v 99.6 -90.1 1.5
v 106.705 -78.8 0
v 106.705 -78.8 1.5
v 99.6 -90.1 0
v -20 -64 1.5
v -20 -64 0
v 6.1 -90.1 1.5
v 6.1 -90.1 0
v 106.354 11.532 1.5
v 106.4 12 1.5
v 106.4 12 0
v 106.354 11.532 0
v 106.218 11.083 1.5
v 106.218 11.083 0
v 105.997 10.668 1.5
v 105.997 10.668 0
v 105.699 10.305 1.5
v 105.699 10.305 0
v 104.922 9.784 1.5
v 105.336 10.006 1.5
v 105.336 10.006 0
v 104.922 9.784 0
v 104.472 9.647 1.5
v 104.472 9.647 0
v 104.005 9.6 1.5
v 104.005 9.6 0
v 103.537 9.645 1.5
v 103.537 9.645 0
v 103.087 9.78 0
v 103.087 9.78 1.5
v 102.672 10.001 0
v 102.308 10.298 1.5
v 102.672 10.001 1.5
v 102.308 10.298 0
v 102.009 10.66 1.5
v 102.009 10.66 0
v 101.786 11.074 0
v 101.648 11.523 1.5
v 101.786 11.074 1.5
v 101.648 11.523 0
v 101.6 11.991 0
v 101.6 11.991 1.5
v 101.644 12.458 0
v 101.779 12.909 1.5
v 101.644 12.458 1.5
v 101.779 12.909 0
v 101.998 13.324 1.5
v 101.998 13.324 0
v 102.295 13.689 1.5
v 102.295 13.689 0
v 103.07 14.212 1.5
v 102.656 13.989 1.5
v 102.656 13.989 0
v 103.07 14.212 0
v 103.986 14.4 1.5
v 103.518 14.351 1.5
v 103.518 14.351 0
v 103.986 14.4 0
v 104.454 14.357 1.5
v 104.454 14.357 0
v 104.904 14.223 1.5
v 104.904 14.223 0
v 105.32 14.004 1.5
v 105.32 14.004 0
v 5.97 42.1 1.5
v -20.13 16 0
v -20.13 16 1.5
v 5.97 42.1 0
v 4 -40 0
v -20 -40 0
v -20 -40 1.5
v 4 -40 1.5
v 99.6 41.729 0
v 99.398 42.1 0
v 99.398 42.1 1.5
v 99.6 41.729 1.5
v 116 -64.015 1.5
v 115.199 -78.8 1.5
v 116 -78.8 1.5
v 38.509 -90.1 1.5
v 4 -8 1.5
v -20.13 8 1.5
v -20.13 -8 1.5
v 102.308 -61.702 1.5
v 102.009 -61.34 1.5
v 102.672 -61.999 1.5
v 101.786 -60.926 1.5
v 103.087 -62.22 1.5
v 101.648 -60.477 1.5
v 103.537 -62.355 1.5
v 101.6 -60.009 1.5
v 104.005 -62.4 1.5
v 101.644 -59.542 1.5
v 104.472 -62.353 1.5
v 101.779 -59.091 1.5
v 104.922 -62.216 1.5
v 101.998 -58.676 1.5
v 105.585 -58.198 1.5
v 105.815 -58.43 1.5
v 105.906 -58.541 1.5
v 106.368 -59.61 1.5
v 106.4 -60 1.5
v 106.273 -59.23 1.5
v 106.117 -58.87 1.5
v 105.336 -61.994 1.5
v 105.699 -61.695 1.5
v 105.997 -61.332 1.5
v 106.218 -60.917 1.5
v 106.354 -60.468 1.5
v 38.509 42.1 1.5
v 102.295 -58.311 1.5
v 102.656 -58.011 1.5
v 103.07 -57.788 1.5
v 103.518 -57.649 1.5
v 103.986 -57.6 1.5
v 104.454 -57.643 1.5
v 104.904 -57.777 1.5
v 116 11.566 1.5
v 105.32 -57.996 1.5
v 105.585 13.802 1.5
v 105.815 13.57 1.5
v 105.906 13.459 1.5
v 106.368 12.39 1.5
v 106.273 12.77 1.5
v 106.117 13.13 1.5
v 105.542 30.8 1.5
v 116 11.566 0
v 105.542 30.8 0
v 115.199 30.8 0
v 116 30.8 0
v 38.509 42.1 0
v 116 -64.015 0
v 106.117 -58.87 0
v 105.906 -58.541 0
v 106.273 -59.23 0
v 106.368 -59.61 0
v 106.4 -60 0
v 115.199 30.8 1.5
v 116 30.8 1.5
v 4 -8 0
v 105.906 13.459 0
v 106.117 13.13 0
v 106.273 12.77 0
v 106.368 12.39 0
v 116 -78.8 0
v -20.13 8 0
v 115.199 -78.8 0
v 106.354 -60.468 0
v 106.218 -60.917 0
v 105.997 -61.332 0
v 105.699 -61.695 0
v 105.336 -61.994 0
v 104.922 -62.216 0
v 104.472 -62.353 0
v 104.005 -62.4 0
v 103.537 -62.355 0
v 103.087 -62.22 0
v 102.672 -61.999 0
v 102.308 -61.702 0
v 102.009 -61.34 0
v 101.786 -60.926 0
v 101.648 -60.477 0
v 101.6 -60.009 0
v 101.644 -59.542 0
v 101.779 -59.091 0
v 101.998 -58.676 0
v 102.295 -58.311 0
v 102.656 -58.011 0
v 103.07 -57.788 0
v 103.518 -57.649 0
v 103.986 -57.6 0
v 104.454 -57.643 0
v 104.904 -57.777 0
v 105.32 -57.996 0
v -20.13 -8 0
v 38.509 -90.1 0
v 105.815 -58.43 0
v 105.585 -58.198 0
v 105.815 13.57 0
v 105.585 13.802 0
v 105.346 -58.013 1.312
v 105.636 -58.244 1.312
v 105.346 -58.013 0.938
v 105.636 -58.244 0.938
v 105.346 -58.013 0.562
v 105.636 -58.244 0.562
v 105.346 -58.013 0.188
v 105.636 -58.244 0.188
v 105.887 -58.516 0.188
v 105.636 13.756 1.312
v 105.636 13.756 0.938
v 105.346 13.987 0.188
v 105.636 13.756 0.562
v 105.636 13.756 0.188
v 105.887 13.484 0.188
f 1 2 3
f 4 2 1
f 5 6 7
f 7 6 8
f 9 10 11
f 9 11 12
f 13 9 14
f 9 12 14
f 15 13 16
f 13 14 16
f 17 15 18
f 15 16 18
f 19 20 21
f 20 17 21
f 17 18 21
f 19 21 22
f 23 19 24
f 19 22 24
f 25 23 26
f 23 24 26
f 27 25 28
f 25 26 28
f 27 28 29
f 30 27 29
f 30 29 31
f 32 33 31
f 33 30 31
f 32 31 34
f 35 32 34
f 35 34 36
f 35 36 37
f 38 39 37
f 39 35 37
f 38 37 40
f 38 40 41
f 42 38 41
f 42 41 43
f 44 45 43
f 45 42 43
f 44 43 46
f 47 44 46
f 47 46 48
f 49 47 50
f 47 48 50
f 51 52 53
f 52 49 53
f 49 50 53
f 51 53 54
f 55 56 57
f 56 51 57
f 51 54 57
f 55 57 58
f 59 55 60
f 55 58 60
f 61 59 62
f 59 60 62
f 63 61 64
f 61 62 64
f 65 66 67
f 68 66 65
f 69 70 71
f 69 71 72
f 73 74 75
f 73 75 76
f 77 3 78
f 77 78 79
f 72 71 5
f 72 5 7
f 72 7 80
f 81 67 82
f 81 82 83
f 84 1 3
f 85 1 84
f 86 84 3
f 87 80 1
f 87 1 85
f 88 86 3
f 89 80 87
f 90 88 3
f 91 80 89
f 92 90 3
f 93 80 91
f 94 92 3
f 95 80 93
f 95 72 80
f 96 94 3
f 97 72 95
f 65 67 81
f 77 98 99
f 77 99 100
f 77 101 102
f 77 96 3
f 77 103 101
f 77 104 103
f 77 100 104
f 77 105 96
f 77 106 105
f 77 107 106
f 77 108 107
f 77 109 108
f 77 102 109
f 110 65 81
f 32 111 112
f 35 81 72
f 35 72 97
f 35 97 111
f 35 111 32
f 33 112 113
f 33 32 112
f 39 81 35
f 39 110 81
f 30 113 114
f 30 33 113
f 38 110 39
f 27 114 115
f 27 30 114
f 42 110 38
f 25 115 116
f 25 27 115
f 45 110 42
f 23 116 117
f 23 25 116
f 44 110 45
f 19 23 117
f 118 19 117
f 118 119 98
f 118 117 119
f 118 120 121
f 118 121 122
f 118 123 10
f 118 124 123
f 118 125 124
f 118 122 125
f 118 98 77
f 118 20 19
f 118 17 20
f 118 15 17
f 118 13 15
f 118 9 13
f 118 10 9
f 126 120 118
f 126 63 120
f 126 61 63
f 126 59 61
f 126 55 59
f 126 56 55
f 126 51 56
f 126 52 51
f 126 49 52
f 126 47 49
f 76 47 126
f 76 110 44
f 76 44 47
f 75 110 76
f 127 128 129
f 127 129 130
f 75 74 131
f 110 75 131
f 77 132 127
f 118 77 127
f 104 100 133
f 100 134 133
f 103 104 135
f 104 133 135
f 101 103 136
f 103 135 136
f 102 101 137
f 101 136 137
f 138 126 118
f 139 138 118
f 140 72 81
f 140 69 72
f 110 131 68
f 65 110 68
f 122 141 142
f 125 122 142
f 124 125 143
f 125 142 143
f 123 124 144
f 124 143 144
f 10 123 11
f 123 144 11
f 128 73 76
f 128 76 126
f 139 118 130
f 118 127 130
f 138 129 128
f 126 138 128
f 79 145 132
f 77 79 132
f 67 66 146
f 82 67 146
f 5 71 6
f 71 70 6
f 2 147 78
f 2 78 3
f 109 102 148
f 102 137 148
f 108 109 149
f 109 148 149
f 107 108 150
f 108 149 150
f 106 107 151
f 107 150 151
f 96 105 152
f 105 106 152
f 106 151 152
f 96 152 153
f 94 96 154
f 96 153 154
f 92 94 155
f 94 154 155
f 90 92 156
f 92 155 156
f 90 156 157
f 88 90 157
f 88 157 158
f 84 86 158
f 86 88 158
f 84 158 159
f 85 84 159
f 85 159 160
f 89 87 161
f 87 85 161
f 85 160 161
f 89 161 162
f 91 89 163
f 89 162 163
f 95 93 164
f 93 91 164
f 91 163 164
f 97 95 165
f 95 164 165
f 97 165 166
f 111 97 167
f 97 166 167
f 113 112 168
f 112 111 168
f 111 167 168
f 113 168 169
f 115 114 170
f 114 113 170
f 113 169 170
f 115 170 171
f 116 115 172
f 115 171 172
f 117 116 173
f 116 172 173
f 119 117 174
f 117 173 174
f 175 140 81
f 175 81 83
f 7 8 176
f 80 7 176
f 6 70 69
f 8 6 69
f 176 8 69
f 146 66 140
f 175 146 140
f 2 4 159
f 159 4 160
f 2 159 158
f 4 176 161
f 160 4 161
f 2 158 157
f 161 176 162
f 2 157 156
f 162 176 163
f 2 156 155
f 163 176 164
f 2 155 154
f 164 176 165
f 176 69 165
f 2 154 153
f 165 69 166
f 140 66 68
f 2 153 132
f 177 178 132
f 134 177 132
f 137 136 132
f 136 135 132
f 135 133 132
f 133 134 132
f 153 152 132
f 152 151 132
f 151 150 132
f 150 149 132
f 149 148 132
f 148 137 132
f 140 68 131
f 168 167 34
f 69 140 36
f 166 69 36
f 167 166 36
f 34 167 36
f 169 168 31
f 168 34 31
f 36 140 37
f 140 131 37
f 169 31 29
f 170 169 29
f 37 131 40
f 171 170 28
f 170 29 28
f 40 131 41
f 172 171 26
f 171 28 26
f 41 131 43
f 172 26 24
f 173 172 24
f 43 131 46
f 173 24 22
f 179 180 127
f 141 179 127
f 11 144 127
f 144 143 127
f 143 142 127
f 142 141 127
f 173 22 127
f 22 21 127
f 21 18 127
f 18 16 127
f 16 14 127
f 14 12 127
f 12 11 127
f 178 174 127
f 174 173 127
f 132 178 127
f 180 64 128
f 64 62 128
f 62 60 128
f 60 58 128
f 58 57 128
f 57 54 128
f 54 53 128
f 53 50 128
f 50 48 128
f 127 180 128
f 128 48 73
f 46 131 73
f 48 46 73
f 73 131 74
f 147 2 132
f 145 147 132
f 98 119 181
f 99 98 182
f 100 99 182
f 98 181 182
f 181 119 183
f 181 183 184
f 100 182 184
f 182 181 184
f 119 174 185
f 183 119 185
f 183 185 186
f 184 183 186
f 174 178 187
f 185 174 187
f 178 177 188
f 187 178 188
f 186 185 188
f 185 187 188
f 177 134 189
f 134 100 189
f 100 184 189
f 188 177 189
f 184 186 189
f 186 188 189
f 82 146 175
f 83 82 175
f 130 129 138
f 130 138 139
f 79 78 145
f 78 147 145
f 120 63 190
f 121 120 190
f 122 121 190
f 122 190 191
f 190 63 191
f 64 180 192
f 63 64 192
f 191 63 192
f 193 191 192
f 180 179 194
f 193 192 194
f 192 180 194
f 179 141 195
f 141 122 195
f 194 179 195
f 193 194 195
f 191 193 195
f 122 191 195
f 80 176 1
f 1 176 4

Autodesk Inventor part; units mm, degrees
ref_plane "YZ Plane" through (0, 0, 0) normal (1, 0, 0) x (0, 1, 0)
ref_plane "XZ Plane" through (0, 0, 0) normal (0, 1, 0) x (-1, 0, 0)
ref_plane "XY Plane" through (0, 0, 0) normal (0, 0, 1) x (1, 0, 0)
sketch "Esboço1" plane through (0, 0, 0) normal (0, 0, 1) x (1, 0, 0)
  line L0 (88, 16) -> (56, 16) projected
  line L1 (88, -64) -> (56, -64) projected
  line L2 (116, -64.0154) -> (116, 11.5655)
  line L3 (-8, -88.1) -> (-8, -95.9) projected
  line L4 (38.5088, -95.9) -> (-8, -95.9) projected
  line L5 (38.5088, -95.9) -> (38.5088, -88.1) projected
  line L6 (38.5088, 47.9) -> (38.5088, 40.1) projected
  line L7 (38.5088, 47.9) -> (-8, 47.9) projected
  line L8 (-8, 40.1) -> (-8, 47.9) projected
  line L9 (99.6, 47.9) -> (99.6, 40.1)
  line L10 (-11.6, -95.9) -> (-11.6, -88.1)
  line L11 (-20, -64) -> (6.1, -90.1)
  line L12 (-20, -64) -> (16.911, -64) construction
  line L13 (-20.13, 16) -> (5.97, 42.1)
  line L14 (-20.13, 16) -> (16.781, 16) construction
  line L15 (99.3981, 42.1) -> (5.97, 42.1)
  line L16 (6.1, -90.1) -> (99.6, -90.1)
  line L17 (116, -64.0154) -> (99.6, -90.1)
  line L18 (99.3981, 42.1) -> (116, 11.5655)
  line L19 (4, -8) -> (-20.13, -8)
  line L20 (-20, -40) -> (4, -40)
  line L21 (4, -40) -> (4, -8)
  line L22 (-20.13, 16) -> (-20.13, -8)
  line L23 (-20, -40) -> (-20, -64)
  spline S0 degree 3 poles (105.3201, 14.0044) (105.3235, 14.0021) (105.3286, 13.9988) (105.3629, 13.9756) (105.3885, 13.9579) (105.4461, 13.9157) (105.482, 13.8884) (105.5584, 13.8259) (105.5988, 13.7906) (105.6725, 13.722) (105.7105, 13.6842) (105.7783, 13.6124) (105.8082, 13.5785) (105.8543, 13.5241) (105.8738, 13.4998) (105.8993, 13.4673) (105.903, 13.4624) (105.9055, 13.4591) knots -0.241565 -0.241565 -0.241565 -0.241565 -0.226467 -0.226467 -0.211369 -0.211369 -0.196271 -0.196271 -0.181173 -0.181173 -0.166076 -0.166076 -0.150978 -0.150978 -0.13588 -0.13588 -0.120782 -0.120782 -0.120782 -0.120782 projected
  circle A0 centre (104, 12) radius 2.4
  spline S1 degree 3 poles (105.3201, -57.9956) (105.3235, -57.9979) (105.3286, -58.0012) (105.3629, -58.0244) (105.3885, -58.0421) (105.4461, -58.0843) (105.482, -58.1116) (105.5584, -58.1741) (105.5988, -58.2094) (105.6725, -58.278) (105.7105, -58.3158) (105.7783, -58.3876) (105.8082, -58.4215) (105.8543, -58.4759) (105.8738, -58.5002) (105.8993, -58.5327) (105.903, -58.5376) (105.9055, -58.5409) knots -0.241565 -0.241565 -0.241565 -0.241565 -0.226467 -0.226467 -0.211369 -0.211369 -0.196271 -0.196271 -0.181173 -0.181173 -0.166076 -0.166076 -0.150978 -0.150978 -0.13588 -0.13588 -0.120782 -0.120782 -0.120782 -0.120782 projected
  circle A1 centre (104, -60) radius 2.4
  line L24 (64, 40.1) -> (96, 40.1) projected
  line L25 (-20.13, -23.115) -> (-20.13, 8) projected
  line L26 (56, -24) -> (88, -24) projected
  line L27 (115.1988, -78.8) -> (116, -78.8) projected
  line L28 (115.1988, 30.8) -> (116, 30.8) projected
  line L29 (116, 30.8) -> (105.542, 30.8)
  line L30 (116, -78.8) -> (106.7046, -78.8)
  line L31 (116, -78.8) -> (116, -64.0154)
  line L32 (116, 11.5655) -> (116, 30.8)
  point P0 (105.4155, 13.9381)
  point P1 (105.8855, 13.4849)
  point P2 (105.4436, -58.0827)
  point P3 (105.8098, -58.4238)
  dimension "d20" = 45
  dimension "d21" = 45
  dimension "d22" = 2
  dimension "d24" = 0
  dimension "d25" = 24
  dimension "d26" = 16
extrude "Extrusão1" add sketch "Esboço1" along normal blind 1.5
properties part number "PCB"
